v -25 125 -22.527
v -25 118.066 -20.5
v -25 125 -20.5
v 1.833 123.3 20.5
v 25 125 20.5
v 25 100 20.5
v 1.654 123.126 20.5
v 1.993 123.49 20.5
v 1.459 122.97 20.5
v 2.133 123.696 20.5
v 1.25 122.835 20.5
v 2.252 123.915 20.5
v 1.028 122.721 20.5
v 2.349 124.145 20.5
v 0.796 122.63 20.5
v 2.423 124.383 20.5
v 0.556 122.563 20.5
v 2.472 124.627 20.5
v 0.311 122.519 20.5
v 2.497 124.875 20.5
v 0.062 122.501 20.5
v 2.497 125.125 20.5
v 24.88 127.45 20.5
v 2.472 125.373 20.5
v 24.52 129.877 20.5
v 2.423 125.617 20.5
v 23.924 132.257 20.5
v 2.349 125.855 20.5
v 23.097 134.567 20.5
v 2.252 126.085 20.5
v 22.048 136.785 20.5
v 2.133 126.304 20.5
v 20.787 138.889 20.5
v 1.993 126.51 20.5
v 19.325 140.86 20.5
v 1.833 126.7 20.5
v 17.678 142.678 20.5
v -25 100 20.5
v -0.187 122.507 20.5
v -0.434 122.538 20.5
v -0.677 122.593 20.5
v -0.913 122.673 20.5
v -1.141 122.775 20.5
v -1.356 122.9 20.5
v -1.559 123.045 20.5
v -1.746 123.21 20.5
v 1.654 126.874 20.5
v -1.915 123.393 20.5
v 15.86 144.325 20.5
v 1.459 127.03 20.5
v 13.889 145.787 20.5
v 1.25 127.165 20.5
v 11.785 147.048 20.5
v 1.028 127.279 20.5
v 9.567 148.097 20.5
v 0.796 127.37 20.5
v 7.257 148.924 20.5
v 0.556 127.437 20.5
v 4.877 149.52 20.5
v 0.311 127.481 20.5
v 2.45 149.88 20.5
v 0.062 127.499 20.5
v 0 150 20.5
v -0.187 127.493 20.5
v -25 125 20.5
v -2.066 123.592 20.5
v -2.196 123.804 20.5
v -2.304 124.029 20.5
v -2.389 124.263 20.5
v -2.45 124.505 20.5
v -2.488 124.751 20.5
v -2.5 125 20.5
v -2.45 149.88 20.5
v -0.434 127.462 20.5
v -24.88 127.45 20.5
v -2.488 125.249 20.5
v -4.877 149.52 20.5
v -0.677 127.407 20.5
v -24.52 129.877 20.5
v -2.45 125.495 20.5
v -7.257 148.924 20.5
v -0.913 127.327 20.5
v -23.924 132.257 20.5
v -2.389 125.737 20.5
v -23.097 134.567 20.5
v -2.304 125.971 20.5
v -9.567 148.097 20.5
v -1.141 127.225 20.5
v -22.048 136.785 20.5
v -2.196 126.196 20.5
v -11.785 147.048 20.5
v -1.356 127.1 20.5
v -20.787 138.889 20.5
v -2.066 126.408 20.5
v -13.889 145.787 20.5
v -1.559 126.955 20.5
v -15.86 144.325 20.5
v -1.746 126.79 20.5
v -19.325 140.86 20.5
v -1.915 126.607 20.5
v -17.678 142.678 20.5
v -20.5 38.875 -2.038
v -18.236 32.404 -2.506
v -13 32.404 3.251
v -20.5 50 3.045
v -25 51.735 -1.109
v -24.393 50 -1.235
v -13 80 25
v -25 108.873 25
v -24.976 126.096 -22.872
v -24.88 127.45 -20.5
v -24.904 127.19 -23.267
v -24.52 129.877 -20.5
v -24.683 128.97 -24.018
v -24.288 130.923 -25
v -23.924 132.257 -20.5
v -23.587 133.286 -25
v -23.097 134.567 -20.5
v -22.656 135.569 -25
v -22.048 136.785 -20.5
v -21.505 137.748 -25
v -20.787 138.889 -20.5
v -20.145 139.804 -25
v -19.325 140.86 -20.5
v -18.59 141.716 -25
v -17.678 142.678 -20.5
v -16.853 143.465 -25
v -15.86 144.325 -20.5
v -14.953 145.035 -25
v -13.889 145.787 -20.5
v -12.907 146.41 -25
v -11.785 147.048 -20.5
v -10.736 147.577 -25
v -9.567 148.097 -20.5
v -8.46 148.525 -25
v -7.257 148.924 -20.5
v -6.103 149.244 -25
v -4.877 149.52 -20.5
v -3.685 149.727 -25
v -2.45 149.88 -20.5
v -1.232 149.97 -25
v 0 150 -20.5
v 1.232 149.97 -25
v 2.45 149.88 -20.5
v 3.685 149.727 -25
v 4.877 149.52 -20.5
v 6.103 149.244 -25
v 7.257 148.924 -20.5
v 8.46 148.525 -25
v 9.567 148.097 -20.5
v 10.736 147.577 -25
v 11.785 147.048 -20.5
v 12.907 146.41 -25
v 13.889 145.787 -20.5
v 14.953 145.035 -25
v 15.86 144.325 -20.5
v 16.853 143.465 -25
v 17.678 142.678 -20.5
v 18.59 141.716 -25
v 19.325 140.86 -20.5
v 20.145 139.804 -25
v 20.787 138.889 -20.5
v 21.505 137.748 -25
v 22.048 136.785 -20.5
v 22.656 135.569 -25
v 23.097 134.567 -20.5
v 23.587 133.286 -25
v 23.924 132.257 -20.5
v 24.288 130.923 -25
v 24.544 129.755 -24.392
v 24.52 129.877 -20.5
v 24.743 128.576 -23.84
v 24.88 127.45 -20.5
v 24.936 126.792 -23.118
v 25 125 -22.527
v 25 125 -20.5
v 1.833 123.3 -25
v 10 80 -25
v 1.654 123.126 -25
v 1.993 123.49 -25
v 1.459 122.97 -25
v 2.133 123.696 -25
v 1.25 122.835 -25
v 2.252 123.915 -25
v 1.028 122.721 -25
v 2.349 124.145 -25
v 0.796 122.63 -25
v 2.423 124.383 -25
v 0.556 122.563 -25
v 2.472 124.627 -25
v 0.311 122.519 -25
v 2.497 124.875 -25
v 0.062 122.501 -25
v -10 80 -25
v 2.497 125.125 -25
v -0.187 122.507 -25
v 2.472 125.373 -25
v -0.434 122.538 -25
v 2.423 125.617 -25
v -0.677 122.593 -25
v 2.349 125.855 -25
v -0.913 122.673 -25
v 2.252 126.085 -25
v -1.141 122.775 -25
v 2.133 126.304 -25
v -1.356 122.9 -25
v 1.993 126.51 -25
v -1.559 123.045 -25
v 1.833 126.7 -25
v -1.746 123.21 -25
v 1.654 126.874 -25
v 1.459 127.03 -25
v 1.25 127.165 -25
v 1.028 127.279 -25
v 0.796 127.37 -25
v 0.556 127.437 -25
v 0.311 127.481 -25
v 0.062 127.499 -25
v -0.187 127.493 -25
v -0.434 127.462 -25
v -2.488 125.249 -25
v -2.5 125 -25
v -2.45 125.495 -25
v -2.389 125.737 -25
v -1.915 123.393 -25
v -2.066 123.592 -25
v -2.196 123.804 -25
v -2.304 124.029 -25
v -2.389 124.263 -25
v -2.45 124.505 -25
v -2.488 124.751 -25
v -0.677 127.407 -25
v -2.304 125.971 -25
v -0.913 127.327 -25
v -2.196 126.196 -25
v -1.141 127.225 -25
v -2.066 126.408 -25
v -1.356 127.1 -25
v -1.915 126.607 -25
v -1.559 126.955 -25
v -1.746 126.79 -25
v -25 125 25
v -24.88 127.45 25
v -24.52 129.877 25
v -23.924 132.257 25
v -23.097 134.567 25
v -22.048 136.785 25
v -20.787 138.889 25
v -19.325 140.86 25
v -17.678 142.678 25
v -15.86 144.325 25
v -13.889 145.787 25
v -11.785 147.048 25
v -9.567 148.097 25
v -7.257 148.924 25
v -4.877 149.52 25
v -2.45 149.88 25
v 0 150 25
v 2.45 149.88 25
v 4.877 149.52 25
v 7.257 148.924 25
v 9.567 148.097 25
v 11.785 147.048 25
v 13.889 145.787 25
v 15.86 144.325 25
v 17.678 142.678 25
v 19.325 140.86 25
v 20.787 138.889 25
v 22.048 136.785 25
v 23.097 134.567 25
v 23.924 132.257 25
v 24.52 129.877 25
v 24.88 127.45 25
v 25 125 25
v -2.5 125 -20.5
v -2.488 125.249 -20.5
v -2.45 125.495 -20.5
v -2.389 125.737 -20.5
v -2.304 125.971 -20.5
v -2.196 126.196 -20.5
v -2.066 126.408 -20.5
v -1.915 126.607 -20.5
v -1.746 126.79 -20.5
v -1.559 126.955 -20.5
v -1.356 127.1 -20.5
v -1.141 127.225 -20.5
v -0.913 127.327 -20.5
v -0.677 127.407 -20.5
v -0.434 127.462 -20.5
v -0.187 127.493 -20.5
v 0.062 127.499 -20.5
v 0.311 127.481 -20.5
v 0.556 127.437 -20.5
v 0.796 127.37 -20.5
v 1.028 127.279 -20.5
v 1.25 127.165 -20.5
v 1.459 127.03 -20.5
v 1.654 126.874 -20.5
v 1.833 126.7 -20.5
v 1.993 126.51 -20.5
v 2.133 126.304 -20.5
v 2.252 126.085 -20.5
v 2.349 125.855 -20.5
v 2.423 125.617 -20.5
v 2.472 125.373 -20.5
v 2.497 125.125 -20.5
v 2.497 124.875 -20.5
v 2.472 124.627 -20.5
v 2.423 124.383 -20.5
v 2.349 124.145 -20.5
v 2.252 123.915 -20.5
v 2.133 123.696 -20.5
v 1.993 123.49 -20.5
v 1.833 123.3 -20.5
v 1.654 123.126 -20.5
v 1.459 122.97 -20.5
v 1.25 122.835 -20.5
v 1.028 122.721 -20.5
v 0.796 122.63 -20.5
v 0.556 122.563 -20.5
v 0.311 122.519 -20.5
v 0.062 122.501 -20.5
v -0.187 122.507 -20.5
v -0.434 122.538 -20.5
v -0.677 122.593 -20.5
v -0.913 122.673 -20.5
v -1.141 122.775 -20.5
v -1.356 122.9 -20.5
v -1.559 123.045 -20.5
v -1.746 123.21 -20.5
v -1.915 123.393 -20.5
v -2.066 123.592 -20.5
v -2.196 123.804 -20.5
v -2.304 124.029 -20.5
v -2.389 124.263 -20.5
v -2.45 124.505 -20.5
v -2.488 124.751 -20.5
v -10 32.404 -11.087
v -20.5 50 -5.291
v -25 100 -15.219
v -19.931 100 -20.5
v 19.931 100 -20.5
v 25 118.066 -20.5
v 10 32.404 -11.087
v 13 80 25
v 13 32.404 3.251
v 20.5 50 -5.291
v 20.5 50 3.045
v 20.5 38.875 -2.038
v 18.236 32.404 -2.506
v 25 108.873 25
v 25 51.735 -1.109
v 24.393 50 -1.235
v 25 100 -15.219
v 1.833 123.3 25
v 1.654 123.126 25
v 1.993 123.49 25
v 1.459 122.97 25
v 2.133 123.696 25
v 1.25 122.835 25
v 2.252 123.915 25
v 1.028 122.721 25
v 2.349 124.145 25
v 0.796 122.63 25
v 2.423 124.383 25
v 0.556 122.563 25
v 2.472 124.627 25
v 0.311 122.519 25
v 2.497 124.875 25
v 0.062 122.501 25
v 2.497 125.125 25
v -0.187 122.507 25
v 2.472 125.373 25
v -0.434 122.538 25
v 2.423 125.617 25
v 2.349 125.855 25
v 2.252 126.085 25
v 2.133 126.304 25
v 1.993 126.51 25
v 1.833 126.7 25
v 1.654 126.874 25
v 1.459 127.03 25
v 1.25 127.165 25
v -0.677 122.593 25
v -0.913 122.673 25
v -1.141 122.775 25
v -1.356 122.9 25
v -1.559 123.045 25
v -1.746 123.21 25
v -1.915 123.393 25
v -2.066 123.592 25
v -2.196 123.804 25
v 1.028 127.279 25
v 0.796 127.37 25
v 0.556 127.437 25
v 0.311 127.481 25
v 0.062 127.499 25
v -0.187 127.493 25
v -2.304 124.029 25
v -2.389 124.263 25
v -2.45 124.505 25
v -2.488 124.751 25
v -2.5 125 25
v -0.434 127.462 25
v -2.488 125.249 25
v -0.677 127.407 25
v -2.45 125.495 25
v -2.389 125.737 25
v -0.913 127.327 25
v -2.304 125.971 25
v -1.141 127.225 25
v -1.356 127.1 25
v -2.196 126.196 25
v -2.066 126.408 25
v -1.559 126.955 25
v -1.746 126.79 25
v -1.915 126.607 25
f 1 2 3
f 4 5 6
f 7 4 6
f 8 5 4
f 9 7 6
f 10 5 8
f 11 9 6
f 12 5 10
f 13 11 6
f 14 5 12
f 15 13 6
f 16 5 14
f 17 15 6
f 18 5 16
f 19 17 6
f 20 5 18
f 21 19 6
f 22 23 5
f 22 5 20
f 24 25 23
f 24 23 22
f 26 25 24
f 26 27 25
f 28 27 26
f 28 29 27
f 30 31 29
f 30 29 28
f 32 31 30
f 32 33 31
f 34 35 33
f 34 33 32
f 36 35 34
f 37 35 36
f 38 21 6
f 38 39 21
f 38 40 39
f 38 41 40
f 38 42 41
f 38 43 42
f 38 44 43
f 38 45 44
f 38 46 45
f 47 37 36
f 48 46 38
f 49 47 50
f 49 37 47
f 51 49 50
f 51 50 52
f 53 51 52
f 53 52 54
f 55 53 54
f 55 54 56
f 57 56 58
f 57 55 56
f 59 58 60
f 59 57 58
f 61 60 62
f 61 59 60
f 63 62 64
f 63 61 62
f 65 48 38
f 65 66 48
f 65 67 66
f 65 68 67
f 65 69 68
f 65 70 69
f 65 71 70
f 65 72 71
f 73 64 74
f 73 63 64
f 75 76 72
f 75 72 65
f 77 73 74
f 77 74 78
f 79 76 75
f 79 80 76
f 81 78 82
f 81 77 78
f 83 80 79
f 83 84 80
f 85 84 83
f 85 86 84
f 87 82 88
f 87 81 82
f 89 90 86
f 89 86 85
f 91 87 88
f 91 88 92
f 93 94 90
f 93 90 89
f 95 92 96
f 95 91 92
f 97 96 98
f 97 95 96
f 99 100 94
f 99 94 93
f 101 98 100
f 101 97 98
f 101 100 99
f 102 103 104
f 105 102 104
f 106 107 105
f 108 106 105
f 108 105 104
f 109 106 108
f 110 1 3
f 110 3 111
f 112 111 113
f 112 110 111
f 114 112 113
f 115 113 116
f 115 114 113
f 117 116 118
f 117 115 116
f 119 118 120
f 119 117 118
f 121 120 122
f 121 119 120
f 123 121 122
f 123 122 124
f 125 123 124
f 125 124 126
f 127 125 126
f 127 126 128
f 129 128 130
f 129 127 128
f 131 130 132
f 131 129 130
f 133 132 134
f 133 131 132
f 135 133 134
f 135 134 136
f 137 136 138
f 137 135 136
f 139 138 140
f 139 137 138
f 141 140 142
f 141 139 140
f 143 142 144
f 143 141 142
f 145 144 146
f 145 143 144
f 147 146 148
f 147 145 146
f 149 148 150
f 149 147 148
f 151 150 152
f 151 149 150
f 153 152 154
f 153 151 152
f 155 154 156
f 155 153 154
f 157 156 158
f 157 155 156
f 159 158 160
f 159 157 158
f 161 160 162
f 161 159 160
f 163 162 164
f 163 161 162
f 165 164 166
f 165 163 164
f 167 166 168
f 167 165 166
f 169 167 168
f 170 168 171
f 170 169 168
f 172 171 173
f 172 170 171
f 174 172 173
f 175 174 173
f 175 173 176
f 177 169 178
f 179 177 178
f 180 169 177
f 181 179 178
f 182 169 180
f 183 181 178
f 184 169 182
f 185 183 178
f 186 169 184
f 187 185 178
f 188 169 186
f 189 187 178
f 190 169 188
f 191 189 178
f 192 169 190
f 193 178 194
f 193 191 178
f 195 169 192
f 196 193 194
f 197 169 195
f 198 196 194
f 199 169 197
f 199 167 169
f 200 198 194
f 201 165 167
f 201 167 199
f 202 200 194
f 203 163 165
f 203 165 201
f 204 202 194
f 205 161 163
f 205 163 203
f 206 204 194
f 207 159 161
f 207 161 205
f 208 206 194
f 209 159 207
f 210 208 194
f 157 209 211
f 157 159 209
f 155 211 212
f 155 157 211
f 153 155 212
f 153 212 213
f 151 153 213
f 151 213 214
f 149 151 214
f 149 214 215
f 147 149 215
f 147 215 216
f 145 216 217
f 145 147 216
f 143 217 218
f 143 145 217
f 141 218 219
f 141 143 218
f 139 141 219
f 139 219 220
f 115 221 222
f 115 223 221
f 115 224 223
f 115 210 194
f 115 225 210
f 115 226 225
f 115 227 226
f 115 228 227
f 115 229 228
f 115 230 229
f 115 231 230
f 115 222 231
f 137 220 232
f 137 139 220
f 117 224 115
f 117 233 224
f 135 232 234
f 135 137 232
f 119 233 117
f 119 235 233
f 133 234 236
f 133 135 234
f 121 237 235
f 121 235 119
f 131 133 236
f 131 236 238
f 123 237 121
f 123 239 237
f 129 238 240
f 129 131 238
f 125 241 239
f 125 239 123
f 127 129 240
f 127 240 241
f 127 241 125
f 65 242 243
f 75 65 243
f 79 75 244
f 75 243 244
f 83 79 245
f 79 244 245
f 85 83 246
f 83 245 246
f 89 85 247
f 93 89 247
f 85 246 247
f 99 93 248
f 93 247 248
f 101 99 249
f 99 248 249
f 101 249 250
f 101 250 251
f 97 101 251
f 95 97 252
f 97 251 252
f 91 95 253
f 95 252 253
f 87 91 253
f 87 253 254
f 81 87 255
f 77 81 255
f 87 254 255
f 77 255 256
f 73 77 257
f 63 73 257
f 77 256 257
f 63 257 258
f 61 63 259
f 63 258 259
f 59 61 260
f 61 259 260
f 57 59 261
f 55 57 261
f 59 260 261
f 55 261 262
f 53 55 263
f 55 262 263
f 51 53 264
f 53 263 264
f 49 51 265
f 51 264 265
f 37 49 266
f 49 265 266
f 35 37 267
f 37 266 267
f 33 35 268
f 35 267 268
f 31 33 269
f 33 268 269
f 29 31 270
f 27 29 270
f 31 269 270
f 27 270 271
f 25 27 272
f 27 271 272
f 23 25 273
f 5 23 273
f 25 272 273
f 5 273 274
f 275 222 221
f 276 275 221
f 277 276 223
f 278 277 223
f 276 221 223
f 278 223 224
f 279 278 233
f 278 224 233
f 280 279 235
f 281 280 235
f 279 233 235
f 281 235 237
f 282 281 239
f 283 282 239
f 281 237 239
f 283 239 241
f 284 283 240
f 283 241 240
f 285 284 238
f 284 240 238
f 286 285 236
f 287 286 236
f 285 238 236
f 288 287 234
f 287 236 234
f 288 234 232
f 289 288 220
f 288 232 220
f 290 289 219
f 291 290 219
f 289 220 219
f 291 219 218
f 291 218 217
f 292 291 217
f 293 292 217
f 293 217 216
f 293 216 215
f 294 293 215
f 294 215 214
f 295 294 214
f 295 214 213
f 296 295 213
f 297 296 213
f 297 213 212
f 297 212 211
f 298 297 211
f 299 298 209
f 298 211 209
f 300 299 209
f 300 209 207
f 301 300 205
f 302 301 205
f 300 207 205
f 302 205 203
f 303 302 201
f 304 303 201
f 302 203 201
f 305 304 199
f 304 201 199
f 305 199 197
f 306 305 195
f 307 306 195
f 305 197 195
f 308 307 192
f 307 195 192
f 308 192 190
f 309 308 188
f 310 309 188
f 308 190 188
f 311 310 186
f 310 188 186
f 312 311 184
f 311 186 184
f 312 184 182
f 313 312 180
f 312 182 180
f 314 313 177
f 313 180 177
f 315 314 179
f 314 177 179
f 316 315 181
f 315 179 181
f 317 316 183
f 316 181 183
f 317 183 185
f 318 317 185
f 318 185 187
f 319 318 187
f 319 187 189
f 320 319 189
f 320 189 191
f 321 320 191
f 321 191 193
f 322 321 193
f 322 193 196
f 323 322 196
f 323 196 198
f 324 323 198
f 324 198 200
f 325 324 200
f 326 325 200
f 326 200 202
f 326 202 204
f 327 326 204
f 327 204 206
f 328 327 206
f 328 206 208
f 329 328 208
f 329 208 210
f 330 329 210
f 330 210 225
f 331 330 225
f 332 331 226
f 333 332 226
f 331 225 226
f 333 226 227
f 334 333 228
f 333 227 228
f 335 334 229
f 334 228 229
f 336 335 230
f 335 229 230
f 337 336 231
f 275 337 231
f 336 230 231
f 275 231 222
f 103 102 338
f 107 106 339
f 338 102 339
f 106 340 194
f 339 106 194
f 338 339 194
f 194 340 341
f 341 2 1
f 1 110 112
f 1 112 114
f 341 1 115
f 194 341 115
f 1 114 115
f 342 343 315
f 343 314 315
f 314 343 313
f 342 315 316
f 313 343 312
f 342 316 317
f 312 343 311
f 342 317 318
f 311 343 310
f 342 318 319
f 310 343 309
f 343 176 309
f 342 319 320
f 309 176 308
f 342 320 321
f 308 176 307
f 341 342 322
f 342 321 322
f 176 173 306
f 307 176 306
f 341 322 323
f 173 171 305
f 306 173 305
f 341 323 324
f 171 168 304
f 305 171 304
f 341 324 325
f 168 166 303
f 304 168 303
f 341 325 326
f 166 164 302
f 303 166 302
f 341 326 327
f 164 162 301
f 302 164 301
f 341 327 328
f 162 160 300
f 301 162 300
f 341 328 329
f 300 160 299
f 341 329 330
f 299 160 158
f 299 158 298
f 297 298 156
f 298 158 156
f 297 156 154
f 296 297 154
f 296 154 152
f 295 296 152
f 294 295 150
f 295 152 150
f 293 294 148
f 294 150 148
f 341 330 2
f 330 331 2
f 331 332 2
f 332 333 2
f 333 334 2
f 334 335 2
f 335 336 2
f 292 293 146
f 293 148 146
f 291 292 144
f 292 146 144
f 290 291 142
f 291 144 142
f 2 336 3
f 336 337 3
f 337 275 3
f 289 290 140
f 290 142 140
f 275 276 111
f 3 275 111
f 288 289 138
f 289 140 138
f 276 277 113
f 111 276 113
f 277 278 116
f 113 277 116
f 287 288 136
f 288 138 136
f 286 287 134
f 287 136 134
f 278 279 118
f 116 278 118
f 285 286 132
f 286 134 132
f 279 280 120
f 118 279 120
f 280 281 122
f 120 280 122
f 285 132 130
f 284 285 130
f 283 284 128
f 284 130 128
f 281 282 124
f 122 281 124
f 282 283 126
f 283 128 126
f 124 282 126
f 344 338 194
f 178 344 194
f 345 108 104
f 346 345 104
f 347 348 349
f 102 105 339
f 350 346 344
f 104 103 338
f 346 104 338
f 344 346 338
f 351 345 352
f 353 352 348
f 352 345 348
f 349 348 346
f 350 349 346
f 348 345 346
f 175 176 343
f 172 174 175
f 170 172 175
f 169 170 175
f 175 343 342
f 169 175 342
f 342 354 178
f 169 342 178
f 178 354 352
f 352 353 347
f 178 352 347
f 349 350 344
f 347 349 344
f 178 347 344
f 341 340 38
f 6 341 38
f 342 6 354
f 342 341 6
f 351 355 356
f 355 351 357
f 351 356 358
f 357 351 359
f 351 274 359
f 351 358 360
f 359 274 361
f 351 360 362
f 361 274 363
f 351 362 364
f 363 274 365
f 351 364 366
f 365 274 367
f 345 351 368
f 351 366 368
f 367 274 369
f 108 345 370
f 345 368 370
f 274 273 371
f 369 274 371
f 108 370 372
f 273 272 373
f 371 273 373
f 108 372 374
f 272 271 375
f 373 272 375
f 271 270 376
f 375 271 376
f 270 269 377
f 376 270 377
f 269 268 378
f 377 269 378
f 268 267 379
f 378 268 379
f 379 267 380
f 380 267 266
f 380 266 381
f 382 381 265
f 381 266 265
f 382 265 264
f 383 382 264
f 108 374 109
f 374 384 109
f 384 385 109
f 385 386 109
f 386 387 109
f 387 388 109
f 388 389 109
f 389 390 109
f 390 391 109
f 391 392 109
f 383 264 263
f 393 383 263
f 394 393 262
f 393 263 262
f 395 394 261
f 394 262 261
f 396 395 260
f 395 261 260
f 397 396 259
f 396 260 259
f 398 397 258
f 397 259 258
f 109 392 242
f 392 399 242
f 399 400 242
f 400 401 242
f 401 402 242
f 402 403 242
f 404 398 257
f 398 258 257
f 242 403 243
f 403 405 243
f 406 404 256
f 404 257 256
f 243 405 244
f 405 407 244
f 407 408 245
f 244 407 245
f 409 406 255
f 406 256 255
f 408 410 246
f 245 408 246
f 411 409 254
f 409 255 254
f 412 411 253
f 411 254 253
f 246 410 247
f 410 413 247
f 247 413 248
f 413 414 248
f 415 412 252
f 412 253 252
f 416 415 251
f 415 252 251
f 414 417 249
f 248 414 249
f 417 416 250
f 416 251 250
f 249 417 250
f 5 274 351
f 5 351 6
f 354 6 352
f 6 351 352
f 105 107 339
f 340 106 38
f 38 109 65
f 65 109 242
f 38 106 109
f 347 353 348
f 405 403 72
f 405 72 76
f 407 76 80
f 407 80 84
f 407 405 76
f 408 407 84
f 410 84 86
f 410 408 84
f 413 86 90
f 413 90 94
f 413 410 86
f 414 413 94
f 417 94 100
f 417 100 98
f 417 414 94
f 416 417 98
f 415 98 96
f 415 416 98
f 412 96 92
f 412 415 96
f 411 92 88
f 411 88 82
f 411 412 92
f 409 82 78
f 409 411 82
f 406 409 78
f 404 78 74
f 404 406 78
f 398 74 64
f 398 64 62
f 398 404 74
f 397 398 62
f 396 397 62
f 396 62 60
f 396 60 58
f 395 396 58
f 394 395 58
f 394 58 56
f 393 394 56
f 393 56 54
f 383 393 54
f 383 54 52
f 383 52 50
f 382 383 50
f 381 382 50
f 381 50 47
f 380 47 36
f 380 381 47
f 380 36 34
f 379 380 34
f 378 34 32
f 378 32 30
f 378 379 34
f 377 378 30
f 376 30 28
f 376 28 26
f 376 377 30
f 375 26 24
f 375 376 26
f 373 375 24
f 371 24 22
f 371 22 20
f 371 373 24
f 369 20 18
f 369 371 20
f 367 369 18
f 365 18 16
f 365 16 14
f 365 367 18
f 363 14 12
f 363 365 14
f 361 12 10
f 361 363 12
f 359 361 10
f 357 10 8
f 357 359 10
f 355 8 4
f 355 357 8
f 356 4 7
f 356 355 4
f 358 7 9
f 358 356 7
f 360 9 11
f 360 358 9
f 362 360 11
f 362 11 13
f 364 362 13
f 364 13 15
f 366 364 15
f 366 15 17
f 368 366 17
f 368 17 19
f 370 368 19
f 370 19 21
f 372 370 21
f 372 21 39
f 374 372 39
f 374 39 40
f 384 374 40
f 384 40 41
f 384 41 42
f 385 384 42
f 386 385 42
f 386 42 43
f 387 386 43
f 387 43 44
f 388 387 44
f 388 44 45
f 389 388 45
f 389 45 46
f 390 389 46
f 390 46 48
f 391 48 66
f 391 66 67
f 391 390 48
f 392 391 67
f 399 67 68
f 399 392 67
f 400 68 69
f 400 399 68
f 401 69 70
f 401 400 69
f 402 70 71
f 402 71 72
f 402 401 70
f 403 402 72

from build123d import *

# Parameters (mm, degrees)
SKETCH1_W               = 50
SKETCH1_H               = 50
BOSS_EXTRUDE1_DEPTH     = 100
SKETCH4_R               = 2.5
BOSS_EXTRUDE2_DEPTH     = 4.5
CUT_EXTRUDE1_DEPTH      = 161.078105936
CUT_EXTRUDE1_DEPTH_BACK = 161.078105936
SKETCH5_R               = 2.5
SKETCH6_W               = 50
SKETCH6_H               = 50
CUT_EXTRUDE2_DEPTH      = 4.5
CUT_EXTRUDE5_DEPTH      = 161.078105936
CUT_EXTRUDE5_DEPTH_BACK = 161.078105936
CHAMFER1_SIZE           = 12


with BuildPart() as part:
    # Sketch1 → Boss-Extrude1 (new body)
    with BuildSketch(Plane(origin=(0, 0, 0), x_dir=(1, 0, 0), z_dir=(0, 1, 0))):
        Rectangle(SKETCH1_W, SKETCH1_H)
    extrude(amount=BOSS_EXTRUDE1_DEPTH)

    # Sketch4 → Boss-Extrude2 (add)
    with BuildSketch(Plane(origin=(0, 0, -25), x_dir=(-1, 0, 0), z_dir=(0, 0, -1))):
        with BuildLine():
            Line((-25, 100), (25, 100))
            Line((25, 100), (25, 125))
            ThreePointArc((25, 125), (0, 150), (-25, 125))
            Line((-25, 125), (-25, 100))
        make_face()
        with Locations((0, 125)):
            Circle(SKETCH4_R, mode=Mode.SUBTRACT)
    boss_extrude2 = extrude(amount=-BOSS_EXTRUDE2_DEPTH)

    # Mirror2: Boss-Extrude2 across plane
    add(boss_extrude2.mirror(Plane.XY))

    # Sketch5 → Cut-Extrude1 (cut, two sides: drawn at the far end of the back side and taken through both)
    with BuildSketch(Plane.ZY.offset(-25).offset(-CUT_EXTRUDE1_DEPTH_BACK)):
        with BuildLine():
            Line((-25, 0), (2.6e-08, 0))
            ThreePointArc((2.6e-08, 0), (-17.67766952, 7.322330461), (-25, 25))
            Line((-25, 25), (-25, 0))
        make_face()
        with BuildLine():
            Line((25, 0), (25, 25))
            ThreePointArc((25, 25), (17.677669539, 7.32233048), (2.6e-08, 0))
            Line((2.6e-08, 0), (25, 0))
        make_face()
        with Locations((0, 25)):
            Circle(SKETCH5_R)
    extrude(amount=CUT_EXTRUDE1_DEPTH + CUT_EXTRUDE1_DEPTH_BACK, mode=Mode.SUBTRACT)

    # Sketch6 → Cut-Extrude2 (cut)
    with BuildSketch(Plane(origin=(25, 0, 0), x_dir=(0, 0, -1), z_dir=(1, 0, 0))):
        with Locations((0, 25)):
            Rectangle(SKETCH6_W, SKETCH6_H)
    cut_extrude2 = extrude(amount=-CUT_EXTRUDE2_DEPTH, mode=Mode.SUBTRACT)

    # Mirror3: Cut-Extrude2 across plane
    add(cut_extrude2.mirror(Plane(origin=(0, 0, 0), x_dir=(0, 0, 1), z_dir=(1, 0, 0))), mode=Mode.SUBTRACT)

    # Sketch8 → Cut-Extrude5 (cut, two sides: drawn at the far end of the back side and taken through both)
    with BuildSketch(Plane(origin=(25, 0, 0), x_dir=(0, 0, -1), z_dir=(1, 0, 0)).offset(-CUT_EXTRUDE5_DEPTH_BACK)):
        Polygon((-25, 80), (-3.250930707, 32.404472018), (11.086507283, 32.404472018), (25, 80), (47.596959839, 33.904901575), (18.755369464, -23.278135991), (-42.095384797, 0), align=None)
    extrude(amount=CUT_EXTRUDE5_DEPTH + CUT_EXTRUDE5_DEPTH_BACK, mode=Mode.SUBTRACT)

    # Chamfer1
    chamfer1_edges = [part.edges().sort_by_distance(p)[0] for p in [
        (25, 65, 18.145657728),
        (-25, 65, 18.145657728),
    ]]
    chamfer(chamfer1_edges, length=CHAMFER1_SIZE)

    # Chamfer2
    # the kernel refuses this chamfer: 15 mm, written as the material it takes off along each edge
    with BuildSketch(Plane(origin=(25, -38.861557394, 9.746529416), x_dir=(0.02749587661058632, 0.2804786274156753, 0.9594663706104734), z_dir=(0, 0.9598292658239239, -0.2805847117501368)), Plane(origin=(-25, 168.861557394, -50.976697476), x_dir=(-0.027495876610586306, 0.2804786274156753, 0.9594663706104732), z_dir=(0, -0.9598292658239239, 0.2805847117501368))) as chamfer2_piece_1:
        with BuildLine():
            Line((15.430097928, 0), (-0.848207323, -15.406766903))
            Line((-0.848207323, -15.406766903), (-1.148093898, -15.39851814))
            ThreePointArc((-1.148093898, -15.39851814), (-0.511938406, -7.700967445), (-0.299886575, 0.008248763))
            Line((-0.299886575, 0.008248763), (0.008248763, 0.299886575))
            ThreePointArc((0.008248763, 0.299886575), (7.717464971, 0.087834744), (15.438346691, 0.299886575))
            Line((15.438346691, 0.299886575), (15.430097928, 0))
        make_face()
    extrude(amount=216.416733875, mode=Mode.SUBTRACT)


solid = part.part
